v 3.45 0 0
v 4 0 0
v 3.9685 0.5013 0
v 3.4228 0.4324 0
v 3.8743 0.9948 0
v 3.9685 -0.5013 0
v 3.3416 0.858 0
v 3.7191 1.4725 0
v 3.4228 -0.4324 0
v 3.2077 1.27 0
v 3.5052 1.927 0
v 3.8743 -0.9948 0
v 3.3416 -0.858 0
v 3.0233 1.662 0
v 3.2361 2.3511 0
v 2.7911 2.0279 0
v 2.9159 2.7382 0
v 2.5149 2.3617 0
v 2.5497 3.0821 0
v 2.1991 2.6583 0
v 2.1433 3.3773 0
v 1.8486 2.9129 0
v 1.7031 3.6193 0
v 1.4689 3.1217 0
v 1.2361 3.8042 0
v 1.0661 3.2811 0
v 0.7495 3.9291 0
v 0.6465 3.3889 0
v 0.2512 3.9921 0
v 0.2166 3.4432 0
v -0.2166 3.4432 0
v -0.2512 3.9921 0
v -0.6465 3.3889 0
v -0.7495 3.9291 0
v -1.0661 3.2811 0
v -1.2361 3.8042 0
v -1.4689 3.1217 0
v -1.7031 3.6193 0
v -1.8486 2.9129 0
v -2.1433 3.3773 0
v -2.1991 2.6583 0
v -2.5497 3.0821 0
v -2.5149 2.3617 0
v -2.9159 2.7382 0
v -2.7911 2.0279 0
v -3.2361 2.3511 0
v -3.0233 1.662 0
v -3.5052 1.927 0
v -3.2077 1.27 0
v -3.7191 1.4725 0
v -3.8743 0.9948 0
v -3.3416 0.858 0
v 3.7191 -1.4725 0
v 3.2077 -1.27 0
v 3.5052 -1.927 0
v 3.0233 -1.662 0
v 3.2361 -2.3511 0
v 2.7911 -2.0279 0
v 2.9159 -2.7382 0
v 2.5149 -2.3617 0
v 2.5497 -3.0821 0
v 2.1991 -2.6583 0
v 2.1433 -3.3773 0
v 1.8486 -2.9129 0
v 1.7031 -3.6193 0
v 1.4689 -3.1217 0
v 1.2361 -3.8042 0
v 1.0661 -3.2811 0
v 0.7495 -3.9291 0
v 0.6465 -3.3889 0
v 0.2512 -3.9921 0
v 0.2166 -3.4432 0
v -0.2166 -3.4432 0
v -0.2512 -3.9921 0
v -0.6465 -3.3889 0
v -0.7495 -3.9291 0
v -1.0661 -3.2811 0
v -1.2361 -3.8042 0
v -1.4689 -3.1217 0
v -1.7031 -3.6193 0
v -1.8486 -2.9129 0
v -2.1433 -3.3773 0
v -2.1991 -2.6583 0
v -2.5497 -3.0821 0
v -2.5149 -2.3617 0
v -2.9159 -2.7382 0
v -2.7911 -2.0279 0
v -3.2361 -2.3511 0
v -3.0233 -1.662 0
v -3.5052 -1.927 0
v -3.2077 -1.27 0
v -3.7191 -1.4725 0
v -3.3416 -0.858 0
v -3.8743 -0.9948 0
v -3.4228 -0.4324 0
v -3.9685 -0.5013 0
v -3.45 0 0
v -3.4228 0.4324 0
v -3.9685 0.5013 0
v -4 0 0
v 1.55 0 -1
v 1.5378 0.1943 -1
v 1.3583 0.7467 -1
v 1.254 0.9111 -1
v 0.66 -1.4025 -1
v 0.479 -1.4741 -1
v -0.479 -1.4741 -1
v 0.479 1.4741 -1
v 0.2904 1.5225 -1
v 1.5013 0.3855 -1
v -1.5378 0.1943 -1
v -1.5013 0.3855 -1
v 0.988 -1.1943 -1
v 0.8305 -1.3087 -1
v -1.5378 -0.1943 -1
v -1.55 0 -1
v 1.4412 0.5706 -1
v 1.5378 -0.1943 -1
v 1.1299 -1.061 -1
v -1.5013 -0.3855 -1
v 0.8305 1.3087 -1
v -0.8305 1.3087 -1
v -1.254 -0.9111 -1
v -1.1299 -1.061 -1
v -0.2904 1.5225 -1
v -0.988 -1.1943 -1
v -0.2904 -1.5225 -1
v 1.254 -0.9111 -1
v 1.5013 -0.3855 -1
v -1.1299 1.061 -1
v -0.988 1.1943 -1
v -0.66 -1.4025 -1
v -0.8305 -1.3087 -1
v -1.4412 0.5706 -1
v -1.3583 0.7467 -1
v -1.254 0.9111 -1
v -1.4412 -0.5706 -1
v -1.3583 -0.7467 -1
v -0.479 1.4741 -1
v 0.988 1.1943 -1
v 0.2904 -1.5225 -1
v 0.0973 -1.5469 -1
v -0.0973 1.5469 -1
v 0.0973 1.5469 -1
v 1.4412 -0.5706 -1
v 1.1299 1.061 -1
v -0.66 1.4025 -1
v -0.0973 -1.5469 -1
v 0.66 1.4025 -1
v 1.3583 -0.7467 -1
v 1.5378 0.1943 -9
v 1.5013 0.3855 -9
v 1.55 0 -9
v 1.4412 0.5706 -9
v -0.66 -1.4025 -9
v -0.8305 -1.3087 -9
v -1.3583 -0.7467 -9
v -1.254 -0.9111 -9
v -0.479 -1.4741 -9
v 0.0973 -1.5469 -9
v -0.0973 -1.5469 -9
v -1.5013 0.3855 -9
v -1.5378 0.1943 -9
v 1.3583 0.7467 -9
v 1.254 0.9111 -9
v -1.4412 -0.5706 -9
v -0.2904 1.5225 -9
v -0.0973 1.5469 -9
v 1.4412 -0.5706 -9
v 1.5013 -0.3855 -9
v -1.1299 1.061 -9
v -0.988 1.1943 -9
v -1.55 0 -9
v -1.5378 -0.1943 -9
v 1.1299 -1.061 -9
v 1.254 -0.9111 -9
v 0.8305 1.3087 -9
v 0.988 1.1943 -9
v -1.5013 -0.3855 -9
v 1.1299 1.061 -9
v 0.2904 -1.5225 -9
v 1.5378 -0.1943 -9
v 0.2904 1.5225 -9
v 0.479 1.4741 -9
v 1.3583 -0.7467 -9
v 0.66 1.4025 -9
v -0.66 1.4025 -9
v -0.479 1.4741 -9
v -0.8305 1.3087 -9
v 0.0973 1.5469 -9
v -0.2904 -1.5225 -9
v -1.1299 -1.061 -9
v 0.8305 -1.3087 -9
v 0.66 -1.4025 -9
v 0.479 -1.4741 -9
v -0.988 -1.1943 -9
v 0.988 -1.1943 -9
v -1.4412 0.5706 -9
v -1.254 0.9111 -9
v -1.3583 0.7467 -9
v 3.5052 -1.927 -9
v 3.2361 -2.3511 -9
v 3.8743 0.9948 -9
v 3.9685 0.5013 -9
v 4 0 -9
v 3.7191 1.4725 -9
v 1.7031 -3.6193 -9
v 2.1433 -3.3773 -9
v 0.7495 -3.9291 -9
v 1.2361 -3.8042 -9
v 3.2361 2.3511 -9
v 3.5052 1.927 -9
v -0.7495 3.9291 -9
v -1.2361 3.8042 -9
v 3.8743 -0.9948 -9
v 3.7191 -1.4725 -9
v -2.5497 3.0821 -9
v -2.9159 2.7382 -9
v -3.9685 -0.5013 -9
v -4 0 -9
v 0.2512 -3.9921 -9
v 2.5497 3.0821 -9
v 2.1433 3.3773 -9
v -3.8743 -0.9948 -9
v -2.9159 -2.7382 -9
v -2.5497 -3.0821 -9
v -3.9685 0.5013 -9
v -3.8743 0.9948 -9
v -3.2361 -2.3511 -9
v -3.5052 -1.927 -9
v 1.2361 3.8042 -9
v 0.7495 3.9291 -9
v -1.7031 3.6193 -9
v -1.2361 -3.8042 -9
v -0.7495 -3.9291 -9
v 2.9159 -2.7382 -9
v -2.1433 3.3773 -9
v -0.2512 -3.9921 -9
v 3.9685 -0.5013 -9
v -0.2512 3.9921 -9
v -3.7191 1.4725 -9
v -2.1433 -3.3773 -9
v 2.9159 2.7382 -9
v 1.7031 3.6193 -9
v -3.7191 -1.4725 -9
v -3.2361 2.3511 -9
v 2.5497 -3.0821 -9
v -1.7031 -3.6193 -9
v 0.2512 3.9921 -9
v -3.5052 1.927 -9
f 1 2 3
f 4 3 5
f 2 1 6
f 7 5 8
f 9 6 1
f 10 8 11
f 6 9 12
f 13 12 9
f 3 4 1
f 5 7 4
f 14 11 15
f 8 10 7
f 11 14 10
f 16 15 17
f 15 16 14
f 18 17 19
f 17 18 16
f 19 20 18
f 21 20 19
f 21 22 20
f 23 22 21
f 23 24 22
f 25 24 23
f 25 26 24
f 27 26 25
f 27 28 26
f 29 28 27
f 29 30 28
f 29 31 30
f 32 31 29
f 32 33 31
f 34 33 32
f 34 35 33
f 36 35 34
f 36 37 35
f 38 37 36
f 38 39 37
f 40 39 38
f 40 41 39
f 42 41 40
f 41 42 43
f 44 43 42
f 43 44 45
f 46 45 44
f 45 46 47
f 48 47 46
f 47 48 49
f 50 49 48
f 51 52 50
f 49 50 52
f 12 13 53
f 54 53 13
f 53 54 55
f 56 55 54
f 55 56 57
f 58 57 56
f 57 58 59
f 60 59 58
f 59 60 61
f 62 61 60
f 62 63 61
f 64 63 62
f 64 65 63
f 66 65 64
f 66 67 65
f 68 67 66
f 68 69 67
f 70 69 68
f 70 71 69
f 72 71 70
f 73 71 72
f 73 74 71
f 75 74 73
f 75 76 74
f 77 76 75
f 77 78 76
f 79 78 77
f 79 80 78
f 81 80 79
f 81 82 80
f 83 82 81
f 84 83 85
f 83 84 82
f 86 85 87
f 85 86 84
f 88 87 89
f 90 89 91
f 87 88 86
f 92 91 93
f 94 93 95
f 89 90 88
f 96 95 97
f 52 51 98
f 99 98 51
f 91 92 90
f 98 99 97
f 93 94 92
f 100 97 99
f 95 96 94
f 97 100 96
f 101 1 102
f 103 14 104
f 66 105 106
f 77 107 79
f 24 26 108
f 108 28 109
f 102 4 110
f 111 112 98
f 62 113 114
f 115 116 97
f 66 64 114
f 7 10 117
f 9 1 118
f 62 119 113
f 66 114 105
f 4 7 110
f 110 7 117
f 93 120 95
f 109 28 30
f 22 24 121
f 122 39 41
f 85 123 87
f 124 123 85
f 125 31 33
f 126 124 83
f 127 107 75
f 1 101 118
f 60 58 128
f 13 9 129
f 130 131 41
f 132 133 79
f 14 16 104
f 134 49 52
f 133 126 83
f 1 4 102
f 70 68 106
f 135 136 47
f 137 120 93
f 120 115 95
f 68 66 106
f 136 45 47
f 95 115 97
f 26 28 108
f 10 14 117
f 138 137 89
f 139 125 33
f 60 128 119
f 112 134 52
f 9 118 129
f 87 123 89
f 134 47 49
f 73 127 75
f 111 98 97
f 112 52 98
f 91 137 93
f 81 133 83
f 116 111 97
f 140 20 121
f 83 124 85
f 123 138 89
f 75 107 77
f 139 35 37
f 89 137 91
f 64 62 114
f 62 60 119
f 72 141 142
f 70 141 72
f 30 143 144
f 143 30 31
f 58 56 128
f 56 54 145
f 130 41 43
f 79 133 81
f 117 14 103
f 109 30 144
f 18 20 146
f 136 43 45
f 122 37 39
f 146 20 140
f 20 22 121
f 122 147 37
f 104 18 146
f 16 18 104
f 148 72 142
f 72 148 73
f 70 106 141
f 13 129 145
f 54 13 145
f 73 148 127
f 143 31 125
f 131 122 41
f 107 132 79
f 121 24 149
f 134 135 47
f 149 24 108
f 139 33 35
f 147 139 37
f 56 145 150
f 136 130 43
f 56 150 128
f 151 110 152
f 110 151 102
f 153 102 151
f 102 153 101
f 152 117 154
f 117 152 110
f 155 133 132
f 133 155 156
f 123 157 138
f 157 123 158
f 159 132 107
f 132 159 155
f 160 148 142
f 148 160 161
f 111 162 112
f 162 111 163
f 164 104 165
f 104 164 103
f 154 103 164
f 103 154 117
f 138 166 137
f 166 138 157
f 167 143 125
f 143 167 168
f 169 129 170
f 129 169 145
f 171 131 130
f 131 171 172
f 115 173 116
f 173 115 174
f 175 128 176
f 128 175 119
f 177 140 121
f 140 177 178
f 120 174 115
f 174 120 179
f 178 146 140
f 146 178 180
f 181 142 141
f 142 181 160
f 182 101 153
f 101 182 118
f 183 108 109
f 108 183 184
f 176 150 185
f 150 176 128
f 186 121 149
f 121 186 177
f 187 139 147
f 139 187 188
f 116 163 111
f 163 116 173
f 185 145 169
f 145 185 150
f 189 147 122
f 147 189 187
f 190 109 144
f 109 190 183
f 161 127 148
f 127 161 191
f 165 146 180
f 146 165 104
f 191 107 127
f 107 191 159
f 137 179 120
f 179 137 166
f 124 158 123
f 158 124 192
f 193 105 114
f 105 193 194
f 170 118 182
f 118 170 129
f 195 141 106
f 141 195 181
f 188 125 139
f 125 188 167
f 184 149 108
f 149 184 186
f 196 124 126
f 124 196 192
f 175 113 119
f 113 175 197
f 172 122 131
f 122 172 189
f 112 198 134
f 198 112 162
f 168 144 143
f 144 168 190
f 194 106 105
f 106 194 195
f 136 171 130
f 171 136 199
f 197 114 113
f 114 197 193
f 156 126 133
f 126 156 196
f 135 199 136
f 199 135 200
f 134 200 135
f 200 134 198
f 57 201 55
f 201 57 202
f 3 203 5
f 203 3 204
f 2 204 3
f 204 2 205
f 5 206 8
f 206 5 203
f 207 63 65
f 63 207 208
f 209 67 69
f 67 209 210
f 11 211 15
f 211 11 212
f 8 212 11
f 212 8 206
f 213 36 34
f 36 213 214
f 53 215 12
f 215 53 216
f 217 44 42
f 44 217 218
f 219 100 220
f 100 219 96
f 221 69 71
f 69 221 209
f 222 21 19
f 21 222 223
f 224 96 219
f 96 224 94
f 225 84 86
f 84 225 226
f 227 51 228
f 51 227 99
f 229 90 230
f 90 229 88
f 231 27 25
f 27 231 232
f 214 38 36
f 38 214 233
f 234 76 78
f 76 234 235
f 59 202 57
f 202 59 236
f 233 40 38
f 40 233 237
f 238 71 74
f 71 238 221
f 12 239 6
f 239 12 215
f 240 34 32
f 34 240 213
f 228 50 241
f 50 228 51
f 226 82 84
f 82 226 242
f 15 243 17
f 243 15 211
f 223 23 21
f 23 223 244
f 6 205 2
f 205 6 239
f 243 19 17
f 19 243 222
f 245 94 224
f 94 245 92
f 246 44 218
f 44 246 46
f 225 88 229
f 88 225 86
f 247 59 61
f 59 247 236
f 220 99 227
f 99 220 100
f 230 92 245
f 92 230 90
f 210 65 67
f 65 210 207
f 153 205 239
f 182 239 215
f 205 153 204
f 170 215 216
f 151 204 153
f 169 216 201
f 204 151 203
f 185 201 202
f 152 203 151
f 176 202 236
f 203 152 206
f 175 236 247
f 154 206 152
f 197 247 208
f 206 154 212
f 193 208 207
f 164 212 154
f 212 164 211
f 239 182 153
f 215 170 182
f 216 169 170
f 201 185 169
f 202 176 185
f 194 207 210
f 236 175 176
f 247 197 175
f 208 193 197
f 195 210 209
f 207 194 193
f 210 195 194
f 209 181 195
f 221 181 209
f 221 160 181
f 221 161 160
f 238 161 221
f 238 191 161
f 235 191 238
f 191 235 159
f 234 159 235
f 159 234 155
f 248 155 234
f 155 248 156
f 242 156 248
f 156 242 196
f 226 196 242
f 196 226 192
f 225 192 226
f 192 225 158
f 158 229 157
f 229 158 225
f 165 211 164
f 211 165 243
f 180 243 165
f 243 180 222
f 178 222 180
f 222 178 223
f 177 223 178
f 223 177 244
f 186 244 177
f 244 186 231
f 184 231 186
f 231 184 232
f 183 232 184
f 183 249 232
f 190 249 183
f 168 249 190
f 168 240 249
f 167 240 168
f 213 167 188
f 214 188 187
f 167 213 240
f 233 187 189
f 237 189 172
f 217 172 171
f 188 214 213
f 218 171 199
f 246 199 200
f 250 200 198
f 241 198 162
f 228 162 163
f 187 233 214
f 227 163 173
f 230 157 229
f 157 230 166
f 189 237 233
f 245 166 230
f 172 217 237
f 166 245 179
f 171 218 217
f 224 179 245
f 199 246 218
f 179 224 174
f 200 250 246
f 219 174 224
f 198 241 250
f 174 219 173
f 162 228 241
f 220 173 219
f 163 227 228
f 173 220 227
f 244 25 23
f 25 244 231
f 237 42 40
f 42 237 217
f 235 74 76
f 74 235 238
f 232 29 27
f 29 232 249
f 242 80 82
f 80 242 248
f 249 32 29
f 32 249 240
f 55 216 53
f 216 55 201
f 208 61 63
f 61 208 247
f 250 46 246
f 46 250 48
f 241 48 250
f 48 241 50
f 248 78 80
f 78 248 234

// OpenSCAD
$fn = 50;

difference() {
	union() {
		translate(v = [0, 0, -9.0]) {
			cylinder(h = 12, r = 4.0);
		}
	}
	union() {
		translate(v = [0, 0, 0]) {
			rotate(a = [0, 0, 0]) {
				difference() {
					union() {
						translate(v = [0, 0, -12.0]) {
							cylinder(h = 12, r = 1.25);
						}
						translate(v = [0, 0, -1.0]) {
							cylinder(h = 1.0, r1 = 1.55, r2 = 3.45);
						}
						translate(v = [0, 0, -12.0]) {
							cylinder(h = 12, r = 1.55);
						}
						translate(v = [0, 0, -12.0]) {
							cylinder(h = 12, r = 1.25);
						}
					}
					union();
				}
			}
		}
		#cylinder(h = 3, r = 5.0);
	}
}
